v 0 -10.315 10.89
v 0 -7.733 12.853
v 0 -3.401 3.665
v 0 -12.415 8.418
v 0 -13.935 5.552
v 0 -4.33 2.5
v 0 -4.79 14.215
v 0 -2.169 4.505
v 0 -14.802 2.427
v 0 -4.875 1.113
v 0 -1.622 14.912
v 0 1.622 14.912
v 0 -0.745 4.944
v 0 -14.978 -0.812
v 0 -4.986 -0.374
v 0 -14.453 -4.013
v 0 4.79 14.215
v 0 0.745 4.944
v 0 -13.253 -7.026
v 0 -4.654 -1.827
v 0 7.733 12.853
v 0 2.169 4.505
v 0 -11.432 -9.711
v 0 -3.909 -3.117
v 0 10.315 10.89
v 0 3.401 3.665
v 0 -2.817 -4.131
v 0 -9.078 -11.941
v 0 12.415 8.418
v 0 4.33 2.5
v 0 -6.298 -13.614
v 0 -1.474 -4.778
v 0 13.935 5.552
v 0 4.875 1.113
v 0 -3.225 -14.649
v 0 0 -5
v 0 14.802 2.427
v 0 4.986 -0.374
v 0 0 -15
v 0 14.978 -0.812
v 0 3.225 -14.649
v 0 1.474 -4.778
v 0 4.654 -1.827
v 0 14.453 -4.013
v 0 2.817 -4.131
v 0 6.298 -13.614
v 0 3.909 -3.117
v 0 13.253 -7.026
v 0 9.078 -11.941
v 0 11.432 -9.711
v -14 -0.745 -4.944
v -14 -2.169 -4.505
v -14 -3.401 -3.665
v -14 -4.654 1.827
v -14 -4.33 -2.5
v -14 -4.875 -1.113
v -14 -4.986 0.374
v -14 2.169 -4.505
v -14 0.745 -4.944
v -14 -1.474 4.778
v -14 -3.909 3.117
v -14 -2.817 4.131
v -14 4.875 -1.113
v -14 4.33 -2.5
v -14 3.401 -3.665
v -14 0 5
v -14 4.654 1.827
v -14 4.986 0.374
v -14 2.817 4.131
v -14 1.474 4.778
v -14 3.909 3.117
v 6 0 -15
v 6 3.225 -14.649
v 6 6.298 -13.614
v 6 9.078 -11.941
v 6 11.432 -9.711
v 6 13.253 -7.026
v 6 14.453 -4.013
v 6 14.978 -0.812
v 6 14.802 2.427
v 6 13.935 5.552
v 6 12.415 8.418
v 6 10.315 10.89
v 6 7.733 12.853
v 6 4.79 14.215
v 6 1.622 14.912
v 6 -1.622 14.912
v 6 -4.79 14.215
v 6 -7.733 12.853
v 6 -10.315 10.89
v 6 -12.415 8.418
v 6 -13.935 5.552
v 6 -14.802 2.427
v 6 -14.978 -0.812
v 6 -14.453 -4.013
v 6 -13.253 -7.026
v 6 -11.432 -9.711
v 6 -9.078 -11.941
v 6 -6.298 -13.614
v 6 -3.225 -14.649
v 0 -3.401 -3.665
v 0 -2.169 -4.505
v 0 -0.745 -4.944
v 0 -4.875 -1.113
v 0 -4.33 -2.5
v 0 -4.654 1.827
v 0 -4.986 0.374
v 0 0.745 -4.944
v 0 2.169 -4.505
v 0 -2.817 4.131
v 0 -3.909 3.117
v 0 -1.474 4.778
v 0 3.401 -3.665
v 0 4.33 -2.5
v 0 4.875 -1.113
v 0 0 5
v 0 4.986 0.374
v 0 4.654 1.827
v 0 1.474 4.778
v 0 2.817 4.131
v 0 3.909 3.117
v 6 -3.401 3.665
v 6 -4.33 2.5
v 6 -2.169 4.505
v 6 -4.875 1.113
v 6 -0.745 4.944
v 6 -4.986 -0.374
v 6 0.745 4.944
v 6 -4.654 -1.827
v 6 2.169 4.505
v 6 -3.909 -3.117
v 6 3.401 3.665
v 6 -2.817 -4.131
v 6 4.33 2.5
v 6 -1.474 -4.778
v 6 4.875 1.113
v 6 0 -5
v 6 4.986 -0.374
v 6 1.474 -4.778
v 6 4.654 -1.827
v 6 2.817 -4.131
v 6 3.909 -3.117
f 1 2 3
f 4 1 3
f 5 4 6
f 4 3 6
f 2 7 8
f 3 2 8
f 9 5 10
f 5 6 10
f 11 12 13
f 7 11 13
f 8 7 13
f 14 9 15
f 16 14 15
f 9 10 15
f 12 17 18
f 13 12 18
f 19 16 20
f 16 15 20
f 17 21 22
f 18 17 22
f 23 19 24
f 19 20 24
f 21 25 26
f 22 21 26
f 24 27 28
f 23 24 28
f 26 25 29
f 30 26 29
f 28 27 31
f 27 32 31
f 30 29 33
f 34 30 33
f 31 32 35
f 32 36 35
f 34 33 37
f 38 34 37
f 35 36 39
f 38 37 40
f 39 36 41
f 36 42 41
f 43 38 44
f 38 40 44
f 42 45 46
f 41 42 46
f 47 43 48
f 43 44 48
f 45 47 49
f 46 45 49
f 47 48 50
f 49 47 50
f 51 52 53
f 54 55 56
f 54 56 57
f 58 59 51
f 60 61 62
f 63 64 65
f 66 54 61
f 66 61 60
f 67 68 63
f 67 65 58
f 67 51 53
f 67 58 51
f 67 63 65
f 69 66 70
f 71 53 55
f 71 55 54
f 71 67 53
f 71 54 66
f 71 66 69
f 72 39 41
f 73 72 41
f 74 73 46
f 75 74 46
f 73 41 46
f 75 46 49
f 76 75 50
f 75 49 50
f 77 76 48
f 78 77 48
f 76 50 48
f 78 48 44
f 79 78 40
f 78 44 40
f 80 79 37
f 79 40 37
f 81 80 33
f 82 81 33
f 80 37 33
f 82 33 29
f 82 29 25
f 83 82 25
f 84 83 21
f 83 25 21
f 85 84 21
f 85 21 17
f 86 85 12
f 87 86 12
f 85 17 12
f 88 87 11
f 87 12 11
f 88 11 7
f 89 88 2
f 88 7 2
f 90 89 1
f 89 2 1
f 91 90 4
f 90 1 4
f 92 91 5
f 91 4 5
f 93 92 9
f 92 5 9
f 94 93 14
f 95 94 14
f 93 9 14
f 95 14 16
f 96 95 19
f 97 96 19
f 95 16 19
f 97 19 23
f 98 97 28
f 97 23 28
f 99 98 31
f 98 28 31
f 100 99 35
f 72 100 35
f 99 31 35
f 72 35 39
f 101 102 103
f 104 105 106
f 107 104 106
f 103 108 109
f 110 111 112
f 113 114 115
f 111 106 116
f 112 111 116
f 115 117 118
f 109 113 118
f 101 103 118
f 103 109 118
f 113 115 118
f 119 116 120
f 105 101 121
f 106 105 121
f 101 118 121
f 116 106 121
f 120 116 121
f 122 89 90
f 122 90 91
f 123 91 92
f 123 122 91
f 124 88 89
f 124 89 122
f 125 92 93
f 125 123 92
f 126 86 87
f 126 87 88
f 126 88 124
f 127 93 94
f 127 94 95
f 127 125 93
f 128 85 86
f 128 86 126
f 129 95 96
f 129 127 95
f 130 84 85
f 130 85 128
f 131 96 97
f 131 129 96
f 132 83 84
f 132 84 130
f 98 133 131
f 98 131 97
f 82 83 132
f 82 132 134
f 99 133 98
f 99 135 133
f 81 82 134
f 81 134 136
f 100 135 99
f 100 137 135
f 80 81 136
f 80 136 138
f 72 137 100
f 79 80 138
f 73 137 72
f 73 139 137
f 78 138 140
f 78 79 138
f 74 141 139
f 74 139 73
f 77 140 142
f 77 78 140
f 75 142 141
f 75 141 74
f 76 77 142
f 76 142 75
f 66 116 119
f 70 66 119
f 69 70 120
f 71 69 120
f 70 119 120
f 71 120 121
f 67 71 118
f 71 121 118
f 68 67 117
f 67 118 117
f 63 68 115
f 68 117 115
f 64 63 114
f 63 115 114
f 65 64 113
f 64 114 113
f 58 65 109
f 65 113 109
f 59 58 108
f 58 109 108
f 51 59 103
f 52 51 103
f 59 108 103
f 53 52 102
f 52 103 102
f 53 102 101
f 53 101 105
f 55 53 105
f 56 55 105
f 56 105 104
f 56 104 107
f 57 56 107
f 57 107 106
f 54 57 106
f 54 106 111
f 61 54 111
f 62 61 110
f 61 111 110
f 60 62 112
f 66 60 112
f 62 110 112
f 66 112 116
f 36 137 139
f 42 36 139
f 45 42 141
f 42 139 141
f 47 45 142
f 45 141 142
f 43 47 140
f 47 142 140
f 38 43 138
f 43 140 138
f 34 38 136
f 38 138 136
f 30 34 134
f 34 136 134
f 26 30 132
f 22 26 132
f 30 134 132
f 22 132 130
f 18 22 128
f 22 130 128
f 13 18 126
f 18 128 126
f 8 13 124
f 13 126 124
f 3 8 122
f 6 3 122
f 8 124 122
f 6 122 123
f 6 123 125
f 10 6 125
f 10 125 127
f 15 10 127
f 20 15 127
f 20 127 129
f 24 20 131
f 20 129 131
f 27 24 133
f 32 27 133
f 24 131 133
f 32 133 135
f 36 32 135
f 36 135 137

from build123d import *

# Parameters (mm, degrees)
IZIM1_R                     = 15
Y_KSEKLIK_EKSTR_ZYON1_DEPTH = 6
IZIM4_R                     = 6
KES_EKSTR_ZYON2_DEPTH       = 14
KES_EKSTR_ZYON2_DEPTH_BACK  = 14
IZIM2_R                     = 5
Y_KSEKLIK_EKSTR_ZYON2_DEPTH = 14
IZIM5_R                     = 6
IZIM5_R_2                   = 5
Y_KSEKLIK_EKSTR_ZYON3_DEPTH = 6


with BuildPart() as part:
    # Çizim1 → Yükseklik-Ekstrüzyon1 (new body)
    with BuildSketch(Plane(origin=(0, 0, 0), x_dir=(0, 0, -1), z_dir=(1, 0, 0))):
        Circle(IZIM1_R)
    extrude(amount=Y_KSEKLIK_EKSTR_ZYON1_DEPTH)

    # Çizim4 → Kes-Ekstrüzyon2 (cut, two sides)
    with BuildSketch(Plane.ZY) as kes_ekstr_zyon2_sk:
        Circle(IZIM4_R)
    extrude(amount=KES_EKSTR_ZYON2_DEPTH, mode=Mode.SUBTRACT)
    extrude(kes_ekstr_zyon2_sk.sketch, amount=-KES_EKSTR_ZYON2_DEPTH_BACK, mode=Mode.SUBTRACT)

    # Çizim5 → Yükseklik-Ekstrüzyon3 (add)
    with BuildSketch(Plane(origin=(6, 0, 0), x_dir=(0, 0, -1), z_dir=(1, 0, 0))):
        Circle(IZIM5_R)
        Circle(IZIM5_R_2, mode=Mode.SUBTRACT)
    extrude(amount=-Y_KSEKLIK_EKSTR_ZYON3_DEPTH)


with BuildPart() as body_2:
    # Çizim2 → Yükseklik-Ekstrüzyon2 (new body)
    with BuildSketch(Plane.ZY):
        Circle(IZIM2_R)
    extrude(amount=Y_KSEKLIK_EKSTR_ZYON2_DEPTH)


solid = Compound([part.part, body_2.part])
